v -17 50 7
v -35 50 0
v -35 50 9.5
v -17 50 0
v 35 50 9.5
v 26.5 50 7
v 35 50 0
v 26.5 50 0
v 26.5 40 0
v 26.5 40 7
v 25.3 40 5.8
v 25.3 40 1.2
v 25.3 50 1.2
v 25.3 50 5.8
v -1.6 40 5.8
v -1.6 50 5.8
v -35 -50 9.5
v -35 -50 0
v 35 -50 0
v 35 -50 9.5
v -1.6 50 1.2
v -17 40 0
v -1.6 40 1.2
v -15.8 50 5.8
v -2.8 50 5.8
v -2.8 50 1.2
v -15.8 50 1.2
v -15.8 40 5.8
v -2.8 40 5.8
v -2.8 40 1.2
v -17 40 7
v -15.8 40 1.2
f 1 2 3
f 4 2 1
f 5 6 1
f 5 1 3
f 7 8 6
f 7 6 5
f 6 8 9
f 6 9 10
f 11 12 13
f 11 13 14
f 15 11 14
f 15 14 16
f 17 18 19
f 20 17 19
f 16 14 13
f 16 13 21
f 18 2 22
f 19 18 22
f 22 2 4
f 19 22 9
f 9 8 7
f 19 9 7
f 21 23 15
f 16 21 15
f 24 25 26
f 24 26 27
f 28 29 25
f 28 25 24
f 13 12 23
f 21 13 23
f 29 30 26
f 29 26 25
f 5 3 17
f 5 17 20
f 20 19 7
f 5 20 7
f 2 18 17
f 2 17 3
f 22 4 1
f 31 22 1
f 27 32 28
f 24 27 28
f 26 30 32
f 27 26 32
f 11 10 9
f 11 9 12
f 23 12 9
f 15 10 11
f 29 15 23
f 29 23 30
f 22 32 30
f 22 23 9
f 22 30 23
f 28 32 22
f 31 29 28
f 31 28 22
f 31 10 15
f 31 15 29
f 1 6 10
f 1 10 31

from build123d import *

# Parameters (mm, degrees)
F0_W     = 70
F0_H     = 100
F1_DEPTH = 9.5
F2_W     = 43.5
F2_H     = 7
F3_DEPTH = 10
F4_W     = 26.9
F4_H     = 4.6
F4_W_2   = 13
F5_DEPTH = 10


with BuildPart() as f1:
    # F0 (on Top) → F1 (new body)
    with BuildSketch(Plane.XY):
        Rectangle(F0_W, F0_H)
    extrude(amount=F1_DEPTH)

    # F2 (on face) → F3 (cut)
    with BuildSketch(Plane(origin=(0, 50, 0), x_dir=(-1, 0, 0), z_dir=(0, 1, 0))):
        with Locations((-4.75, 3.5)):
            Rectangle(F2_W, F2_H)
    extrude(amount=-F3_DEPTH, mode=Mode.SUBTRACT)

    # F4 (on face) → F5 (join)
    with BuildSketch(Plane(origin=(0, 40, 0), x_dir=(-1, 0, 0), z_dir=(0, 1, 0))):
        with Locations((-11.85, 3.5)):
            Rectangle(F4_W, F4_H)
        with Locations((9.3, 3.5)):
            Rectangle(F4_W_2, F4_H)
    extrude(amount=F5_DEPTH)


solid = f1.part
